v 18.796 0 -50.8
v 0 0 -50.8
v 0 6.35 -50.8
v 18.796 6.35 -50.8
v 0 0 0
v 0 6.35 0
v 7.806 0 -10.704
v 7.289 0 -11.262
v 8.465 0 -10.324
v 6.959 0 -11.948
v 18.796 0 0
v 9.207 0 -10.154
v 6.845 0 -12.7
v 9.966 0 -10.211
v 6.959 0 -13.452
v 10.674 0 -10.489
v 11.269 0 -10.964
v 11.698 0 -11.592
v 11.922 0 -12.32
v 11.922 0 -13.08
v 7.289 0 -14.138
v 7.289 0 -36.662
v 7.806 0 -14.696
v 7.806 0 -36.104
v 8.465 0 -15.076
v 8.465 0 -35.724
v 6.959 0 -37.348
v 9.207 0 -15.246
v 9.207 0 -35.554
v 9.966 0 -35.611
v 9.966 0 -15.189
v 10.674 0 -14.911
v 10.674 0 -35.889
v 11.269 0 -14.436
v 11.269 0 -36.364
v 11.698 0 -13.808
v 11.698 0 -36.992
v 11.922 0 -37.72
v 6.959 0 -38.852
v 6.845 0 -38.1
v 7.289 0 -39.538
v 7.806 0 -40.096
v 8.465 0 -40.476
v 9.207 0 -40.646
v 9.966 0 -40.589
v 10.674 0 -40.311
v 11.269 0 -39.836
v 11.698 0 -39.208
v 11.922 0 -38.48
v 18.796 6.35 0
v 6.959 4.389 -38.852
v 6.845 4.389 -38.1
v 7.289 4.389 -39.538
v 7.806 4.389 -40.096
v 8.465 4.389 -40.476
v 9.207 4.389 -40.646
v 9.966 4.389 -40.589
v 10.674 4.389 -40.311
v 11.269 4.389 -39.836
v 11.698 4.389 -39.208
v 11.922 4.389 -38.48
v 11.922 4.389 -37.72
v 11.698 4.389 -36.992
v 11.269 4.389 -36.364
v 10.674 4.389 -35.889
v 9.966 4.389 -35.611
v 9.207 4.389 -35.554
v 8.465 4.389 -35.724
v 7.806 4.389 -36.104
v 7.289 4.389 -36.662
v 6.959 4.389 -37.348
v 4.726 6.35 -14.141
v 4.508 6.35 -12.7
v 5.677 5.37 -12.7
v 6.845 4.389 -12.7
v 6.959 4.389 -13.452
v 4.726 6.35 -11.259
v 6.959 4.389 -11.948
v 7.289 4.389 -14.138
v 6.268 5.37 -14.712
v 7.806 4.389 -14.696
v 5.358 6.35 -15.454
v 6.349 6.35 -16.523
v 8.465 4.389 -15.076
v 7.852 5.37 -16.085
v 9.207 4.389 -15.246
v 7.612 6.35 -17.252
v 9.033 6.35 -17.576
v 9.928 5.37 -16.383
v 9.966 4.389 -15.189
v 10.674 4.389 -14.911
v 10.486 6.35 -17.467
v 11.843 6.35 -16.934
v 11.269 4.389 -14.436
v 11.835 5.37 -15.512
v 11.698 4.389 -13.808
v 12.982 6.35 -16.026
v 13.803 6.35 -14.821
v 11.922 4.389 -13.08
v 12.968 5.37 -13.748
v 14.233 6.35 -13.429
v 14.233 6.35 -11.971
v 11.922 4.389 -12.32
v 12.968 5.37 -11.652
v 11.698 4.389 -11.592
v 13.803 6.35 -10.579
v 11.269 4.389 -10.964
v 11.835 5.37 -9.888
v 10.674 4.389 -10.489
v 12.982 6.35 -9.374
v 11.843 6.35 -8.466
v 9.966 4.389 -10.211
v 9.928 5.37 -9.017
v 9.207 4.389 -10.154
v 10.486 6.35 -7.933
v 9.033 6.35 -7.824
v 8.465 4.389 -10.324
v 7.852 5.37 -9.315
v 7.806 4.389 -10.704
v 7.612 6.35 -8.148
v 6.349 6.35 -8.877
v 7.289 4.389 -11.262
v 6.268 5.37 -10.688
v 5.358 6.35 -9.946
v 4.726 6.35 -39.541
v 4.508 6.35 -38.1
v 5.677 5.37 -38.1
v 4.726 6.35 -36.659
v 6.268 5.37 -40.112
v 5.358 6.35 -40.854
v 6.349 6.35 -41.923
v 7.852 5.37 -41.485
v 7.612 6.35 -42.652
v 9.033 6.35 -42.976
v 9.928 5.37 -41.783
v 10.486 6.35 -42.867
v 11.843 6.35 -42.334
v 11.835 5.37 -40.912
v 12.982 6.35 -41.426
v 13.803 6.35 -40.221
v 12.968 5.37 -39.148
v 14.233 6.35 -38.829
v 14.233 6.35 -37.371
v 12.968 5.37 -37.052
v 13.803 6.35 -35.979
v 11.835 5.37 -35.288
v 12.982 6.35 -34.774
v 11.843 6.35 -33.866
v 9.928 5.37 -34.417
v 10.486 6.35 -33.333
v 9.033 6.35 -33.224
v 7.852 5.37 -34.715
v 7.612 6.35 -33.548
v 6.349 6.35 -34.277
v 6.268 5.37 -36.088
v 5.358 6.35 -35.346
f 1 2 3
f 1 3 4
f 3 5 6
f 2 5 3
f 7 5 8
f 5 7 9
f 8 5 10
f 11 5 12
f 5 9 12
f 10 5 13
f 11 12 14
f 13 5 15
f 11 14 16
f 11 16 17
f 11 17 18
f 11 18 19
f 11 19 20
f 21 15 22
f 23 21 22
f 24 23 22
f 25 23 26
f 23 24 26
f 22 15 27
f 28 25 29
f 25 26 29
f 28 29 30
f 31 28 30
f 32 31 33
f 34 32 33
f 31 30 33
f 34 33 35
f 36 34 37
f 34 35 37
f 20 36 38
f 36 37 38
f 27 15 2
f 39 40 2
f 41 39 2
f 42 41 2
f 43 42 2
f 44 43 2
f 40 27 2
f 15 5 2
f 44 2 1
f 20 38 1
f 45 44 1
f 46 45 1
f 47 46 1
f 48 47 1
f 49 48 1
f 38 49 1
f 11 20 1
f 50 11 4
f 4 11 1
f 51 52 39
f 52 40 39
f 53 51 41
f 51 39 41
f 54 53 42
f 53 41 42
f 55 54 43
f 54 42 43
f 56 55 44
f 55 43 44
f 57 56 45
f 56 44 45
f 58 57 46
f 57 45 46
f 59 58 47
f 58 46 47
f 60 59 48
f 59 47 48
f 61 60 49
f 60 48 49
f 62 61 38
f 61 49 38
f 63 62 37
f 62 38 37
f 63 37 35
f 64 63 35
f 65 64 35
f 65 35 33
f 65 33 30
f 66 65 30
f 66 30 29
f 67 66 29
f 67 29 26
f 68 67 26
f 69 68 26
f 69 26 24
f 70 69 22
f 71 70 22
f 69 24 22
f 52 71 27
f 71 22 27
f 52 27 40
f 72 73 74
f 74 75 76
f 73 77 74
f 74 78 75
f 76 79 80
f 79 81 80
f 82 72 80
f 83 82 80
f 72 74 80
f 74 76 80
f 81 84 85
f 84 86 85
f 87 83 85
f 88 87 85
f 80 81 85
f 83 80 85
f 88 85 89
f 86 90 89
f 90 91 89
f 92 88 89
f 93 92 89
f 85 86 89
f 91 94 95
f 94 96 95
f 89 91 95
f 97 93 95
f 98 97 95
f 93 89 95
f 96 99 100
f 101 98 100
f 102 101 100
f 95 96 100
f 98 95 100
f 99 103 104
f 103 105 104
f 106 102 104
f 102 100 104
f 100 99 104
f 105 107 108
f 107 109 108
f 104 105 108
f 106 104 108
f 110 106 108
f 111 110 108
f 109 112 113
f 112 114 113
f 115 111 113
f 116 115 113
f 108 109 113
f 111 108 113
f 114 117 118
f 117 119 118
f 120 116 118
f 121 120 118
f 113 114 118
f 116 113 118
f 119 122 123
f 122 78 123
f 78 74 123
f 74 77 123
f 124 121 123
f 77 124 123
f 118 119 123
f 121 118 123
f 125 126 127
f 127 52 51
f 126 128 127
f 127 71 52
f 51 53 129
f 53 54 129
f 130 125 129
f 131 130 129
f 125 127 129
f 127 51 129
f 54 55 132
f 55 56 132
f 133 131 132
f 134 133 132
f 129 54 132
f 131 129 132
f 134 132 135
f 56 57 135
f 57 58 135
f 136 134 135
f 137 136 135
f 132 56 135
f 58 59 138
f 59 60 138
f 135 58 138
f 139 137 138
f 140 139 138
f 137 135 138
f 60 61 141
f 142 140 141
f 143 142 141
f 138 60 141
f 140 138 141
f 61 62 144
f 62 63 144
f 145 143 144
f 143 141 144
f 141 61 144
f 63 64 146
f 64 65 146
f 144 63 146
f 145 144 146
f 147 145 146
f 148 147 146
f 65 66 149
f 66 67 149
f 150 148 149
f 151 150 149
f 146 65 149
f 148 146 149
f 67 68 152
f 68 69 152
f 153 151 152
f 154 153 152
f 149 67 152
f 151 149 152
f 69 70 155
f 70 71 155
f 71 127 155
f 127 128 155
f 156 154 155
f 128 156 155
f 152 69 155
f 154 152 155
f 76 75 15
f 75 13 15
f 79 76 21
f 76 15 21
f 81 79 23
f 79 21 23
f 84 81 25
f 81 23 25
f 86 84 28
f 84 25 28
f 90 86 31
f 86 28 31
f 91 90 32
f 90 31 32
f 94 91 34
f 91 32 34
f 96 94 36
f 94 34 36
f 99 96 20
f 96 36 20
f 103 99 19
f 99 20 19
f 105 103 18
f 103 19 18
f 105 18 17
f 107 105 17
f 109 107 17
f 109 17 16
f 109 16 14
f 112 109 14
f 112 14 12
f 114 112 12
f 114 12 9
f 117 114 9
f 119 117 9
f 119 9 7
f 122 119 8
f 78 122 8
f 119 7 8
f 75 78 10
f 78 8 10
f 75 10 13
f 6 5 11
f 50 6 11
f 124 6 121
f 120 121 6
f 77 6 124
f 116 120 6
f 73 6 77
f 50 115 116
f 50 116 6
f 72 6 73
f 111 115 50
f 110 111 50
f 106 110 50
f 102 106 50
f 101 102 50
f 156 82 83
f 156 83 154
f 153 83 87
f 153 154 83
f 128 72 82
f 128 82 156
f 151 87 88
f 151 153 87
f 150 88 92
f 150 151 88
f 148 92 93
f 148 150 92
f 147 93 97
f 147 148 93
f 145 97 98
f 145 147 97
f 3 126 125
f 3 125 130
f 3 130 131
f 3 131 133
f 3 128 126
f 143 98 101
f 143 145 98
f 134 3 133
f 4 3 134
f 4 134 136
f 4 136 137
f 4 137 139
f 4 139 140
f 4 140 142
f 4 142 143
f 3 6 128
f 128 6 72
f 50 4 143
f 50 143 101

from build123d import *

# Parameters (mm, degrees)
SKETCH1_W                                          = 18.796
SKETCH1_H                                          = 50.8
BOSS_EXTRUDE1_DEPTH                                = 6.35
CSK_FOR_10_FLAT_HEAD_MACHINE_SCREW_100_D           = 5.1054
CSK_FOR_10_FLAT_HEAD_MACHINE_SCREW_100_DEPTH       = 25.4
CSK_FOR_10_FLAT_HEAD_MACHINE_SCREW_100_CSINK_D     = 9.779
CSK_FOR_10_FLAT_HEAD_MACHINE_SCREW_100_CSINK_ANGLE = 100
CSK_FOR_10_FLAT_HEAD_MACHINE_SCREW_100_TIP         = 1.533816902


with BuildPart() as part:
    # Sketch1 → Boss-Extrude1 (new body)
    with BuildSketch(Plane(origin=(0, 0, 0), x_dir=(1, 0, 0), z_dir=(0, 1, 0))):
        with Locations((9.398, 25.4)):
            Rectangle(SKETCH1_W, SKETCH1_H)
    extrude(amount=BOSS_EXTRUDE1_DEPTH)

    # CSK for #10 Flat Head Machine Screw (100)1
    with Locations(Plane(origin=(0, 6.35, 0), x_dir=(1, 0, 0), z_dir=(0, 1, 0))):
        with Locations((9.398, 38.1), (9.398, 12.7)):
            CounterSinkHole(CSK_FOR_10_FLAT_HEAD_MACHINE_SCREW_100_D / 2, CSK_FOR_10_FLAT_HEAD_MACHINE_SCREW_100_CSINK_D / 2, depth=CSK_FOR_10_FLAT_HEAD_MACHINE_SCREW_100_DEPTH, counter_sink_angle=CSK_FOR_10_FLAT_HEAD_MACHINE_SCREW_100_CSINK_ANGLE)
            with Locations((0, 0, -(CSK_FOR_10_FLAT_HEAD_MACHINE_SCREW_100_DEPTH + CSK_FOR_10_FLAT_HEAD_MACHINE_SCREW_100_TIP / 2))):  # 118° drill point
                Cone(0, CSK_FOR_10_FLAT_HEAD_MACHINE_SCREW_100_D / 2, CSK_FOR_10_FLAT_HEAD_MACHINE_SCREW_100_TIP, mode=Mode.SUBTRACT)


solid = part.part
